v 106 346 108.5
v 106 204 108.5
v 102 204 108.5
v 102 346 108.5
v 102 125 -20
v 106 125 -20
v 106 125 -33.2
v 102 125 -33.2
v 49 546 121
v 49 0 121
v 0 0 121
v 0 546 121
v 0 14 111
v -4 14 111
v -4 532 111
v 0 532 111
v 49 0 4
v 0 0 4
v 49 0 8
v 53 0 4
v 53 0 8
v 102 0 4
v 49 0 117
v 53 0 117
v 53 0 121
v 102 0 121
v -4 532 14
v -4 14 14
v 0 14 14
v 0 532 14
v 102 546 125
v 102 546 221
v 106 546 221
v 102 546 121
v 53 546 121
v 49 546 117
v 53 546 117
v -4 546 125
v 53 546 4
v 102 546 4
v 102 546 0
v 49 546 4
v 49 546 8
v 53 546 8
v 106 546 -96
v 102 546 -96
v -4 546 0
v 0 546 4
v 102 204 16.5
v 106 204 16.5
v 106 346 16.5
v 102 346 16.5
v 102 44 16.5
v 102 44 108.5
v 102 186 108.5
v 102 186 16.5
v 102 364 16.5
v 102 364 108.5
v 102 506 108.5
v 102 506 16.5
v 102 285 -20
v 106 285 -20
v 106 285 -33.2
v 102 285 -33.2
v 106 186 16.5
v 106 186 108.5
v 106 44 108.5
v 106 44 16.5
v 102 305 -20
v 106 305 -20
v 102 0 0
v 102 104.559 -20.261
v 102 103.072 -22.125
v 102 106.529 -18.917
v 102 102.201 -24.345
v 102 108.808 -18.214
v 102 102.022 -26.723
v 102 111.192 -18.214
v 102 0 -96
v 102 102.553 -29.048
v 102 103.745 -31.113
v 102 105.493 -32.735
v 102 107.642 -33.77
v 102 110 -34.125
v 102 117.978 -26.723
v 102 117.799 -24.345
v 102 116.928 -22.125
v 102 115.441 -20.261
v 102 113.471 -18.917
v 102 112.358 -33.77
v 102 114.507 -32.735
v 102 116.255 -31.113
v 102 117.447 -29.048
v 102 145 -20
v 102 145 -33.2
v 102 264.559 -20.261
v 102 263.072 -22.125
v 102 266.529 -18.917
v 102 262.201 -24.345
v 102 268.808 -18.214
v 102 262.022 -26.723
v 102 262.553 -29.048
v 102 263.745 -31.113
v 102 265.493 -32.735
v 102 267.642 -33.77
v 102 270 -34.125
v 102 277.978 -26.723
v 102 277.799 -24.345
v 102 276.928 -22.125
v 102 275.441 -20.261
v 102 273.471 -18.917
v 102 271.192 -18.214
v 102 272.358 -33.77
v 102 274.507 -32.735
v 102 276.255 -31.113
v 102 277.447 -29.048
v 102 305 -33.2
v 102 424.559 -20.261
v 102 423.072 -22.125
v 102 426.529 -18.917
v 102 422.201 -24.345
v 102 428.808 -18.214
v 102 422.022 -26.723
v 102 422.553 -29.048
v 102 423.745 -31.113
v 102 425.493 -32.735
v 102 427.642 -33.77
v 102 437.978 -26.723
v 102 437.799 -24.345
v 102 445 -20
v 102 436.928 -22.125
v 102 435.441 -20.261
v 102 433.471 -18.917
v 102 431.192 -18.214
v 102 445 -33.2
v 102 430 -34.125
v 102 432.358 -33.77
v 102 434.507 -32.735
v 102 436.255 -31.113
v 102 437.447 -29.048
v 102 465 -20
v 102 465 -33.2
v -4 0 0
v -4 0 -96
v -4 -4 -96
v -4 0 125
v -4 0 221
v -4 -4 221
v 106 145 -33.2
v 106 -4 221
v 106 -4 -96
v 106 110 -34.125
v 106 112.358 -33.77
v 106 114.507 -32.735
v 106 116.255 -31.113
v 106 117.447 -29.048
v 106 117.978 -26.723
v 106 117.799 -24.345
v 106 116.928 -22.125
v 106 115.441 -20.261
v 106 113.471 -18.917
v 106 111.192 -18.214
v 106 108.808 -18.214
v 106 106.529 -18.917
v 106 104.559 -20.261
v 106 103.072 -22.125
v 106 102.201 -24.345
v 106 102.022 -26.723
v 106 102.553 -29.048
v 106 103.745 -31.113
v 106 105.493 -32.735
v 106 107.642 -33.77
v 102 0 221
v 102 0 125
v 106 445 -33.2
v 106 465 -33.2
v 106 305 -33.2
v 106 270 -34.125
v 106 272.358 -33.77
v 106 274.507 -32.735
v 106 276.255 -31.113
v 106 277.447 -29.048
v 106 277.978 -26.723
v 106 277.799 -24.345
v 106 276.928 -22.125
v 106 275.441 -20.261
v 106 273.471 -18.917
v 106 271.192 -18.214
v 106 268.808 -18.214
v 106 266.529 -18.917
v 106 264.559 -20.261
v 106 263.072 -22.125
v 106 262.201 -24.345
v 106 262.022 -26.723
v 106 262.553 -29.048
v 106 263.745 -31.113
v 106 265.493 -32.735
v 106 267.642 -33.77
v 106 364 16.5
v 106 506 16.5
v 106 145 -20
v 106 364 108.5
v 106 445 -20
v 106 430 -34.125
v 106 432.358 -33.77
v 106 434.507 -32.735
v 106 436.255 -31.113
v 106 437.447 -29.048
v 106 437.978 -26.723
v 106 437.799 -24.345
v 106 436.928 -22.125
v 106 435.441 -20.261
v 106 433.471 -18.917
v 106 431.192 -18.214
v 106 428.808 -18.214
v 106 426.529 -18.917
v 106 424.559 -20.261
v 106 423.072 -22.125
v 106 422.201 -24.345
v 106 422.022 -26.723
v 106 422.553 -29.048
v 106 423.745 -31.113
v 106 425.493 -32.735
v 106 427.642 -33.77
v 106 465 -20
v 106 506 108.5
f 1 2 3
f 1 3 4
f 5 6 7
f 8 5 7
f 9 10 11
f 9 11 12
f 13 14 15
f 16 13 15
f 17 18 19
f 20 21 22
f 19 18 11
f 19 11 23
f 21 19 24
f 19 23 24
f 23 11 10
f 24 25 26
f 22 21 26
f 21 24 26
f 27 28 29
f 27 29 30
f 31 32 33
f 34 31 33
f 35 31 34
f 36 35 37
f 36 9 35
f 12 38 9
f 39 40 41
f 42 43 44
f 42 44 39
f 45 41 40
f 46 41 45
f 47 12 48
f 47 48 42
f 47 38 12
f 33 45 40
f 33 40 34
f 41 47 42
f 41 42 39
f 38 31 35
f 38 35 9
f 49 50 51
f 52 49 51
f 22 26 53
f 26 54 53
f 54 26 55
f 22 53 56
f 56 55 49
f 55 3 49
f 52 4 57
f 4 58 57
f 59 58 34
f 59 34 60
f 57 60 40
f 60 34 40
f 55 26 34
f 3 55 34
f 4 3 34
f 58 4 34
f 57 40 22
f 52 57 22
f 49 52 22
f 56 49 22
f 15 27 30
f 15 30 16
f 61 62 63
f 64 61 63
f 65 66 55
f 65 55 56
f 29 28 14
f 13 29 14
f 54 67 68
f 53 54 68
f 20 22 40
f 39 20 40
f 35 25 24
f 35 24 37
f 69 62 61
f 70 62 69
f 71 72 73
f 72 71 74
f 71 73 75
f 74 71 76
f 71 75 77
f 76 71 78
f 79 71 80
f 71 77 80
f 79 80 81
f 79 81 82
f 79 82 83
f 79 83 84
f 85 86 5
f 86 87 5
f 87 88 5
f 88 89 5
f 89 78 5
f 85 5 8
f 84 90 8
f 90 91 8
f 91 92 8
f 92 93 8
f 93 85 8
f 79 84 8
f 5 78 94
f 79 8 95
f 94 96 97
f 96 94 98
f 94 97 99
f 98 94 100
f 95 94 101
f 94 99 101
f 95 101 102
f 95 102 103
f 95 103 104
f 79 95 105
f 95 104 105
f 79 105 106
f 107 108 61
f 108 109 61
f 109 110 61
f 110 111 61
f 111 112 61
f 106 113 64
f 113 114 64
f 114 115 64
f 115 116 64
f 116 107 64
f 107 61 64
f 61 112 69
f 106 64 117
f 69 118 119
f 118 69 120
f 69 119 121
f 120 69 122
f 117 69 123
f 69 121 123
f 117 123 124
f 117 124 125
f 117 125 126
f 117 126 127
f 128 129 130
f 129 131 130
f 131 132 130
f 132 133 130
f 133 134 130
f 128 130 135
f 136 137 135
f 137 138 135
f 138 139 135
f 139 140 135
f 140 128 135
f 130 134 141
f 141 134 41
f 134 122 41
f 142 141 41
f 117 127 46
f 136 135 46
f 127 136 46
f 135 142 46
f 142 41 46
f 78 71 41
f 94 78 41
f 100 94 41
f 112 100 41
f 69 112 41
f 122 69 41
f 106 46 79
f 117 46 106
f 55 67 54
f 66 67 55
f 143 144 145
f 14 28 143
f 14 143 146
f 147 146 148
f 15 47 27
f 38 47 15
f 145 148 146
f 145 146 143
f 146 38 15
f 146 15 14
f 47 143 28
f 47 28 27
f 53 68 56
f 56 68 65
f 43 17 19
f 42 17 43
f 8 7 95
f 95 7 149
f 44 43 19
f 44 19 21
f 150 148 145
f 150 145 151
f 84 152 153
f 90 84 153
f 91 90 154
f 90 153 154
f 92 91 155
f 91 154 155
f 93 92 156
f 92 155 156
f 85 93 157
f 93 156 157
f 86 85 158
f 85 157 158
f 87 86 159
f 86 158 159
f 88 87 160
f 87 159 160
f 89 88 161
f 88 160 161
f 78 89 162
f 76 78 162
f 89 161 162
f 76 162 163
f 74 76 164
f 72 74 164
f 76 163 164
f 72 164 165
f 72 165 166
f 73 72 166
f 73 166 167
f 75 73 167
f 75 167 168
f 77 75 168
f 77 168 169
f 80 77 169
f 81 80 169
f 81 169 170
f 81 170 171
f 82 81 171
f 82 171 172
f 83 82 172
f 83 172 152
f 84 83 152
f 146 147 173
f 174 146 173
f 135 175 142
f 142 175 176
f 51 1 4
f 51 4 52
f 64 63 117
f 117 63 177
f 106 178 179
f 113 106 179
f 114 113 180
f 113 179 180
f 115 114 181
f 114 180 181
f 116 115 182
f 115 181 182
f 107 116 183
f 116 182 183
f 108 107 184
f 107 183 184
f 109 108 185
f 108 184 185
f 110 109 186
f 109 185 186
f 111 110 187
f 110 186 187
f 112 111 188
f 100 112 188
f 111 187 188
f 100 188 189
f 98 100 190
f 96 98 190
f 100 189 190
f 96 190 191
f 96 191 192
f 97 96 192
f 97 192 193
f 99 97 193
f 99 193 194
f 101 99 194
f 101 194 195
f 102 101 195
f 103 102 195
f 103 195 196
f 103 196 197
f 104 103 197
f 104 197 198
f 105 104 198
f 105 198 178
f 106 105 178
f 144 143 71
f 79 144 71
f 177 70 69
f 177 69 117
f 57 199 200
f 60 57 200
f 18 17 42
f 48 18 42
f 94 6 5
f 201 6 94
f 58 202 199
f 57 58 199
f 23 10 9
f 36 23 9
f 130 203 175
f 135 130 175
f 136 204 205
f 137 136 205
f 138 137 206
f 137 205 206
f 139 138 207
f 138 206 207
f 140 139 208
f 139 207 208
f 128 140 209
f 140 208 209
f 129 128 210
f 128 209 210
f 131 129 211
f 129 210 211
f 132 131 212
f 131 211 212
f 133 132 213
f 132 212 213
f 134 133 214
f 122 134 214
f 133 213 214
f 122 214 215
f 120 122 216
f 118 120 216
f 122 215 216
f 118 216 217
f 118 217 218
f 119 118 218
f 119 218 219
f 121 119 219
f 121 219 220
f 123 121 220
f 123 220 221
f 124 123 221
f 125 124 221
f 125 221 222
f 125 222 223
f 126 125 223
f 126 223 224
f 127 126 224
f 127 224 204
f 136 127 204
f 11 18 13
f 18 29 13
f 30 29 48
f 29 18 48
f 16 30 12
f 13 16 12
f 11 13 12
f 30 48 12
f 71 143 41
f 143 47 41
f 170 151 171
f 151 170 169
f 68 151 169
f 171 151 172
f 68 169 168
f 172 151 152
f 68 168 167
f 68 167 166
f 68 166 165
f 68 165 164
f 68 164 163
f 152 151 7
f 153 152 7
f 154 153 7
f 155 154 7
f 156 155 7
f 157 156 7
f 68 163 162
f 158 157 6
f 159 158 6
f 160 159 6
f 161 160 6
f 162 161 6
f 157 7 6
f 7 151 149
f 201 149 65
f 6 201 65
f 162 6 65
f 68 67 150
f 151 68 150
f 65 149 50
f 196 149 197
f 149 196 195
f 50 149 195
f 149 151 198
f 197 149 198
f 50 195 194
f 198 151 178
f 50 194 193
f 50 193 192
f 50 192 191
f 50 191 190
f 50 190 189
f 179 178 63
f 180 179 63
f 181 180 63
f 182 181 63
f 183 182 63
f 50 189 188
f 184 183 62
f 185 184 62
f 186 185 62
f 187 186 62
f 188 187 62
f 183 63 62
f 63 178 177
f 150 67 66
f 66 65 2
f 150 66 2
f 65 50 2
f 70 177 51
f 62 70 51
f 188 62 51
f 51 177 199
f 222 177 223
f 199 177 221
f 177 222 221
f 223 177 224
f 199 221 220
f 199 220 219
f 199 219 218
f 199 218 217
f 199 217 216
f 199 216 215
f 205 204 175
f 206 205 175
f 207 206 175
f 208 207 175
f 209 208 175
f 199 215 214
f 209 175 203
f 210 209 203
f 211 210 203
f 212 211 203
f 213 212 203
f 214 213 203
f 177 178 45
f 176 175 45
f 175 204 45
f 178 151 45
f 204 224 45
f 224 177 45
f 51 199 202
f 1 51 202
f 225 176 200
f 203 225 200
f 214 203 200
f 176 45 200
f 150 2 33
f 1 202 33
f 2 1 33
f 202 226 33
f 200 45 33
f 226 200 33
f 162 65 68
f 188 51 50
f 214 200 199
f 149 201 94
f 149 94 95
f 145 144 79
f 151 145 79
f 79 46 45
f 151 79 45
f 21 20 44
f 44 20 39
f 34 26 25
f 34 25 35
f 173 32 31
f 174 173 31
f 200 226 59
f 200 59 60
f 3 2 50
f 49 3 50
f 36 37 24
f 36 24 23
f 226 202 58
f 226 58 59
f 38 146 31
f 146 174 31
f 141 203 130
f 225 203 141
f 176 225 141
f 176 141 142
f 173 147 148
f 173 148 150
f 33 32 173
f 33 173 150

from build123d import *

# Parameters (mm, degrees)
ESQUISSE1_W             = 102
ESQUISSE1_H             = 546
BOSS_EXTRU_1_DEPTH      = 125
ESQUISSE2_W             = 117
ESQUISSE2_H             = 546
ENL_V_MAT_EXTRU_1_DEPTH = 570.3373341
ESQUISSE3_W             = 4
ESQUISSE3_H             = 546
BOSS_EXTRU_2_DEPTH      = 4
ESQUISSE4_W             = 4
ESQUISSE4_H             = 546
BOSS_EXTRU_3_DEPTH      = 4
ESQUISSE5_W             = 125
ESQUISSE5_H             = 546
BOSS_EXTRU_4_DEPTH      = 4
ESQUISSE6_W             = 97
ESQUISSE6_H             = 518
ENL_V_MAT_EXTRU_2_DEPTH = 571.067539858
ESQUISSE7_W             = 317
ESQUISSE7_H             = 546
BOSS_EXTRU_5_DEPTH      = 4
ESQUISSE8_W             = 92
ESQUISSE8_H             = 142
ENL_V_MAT_EXTRU_3_DEPTH = 600.21365138
ESQUISSE10_W            = 13.2
ESQUISSE10_H            = 20
ENL_V_MAT_EXTRU_4_DEPTH = 600.21365138
ESQUISSE12_R            = 8
ENL_V_MAT_EXTRU_5_DEPTH = 600.21365138
ESQUISSE13_W            = 110
ESQUISSE13_H            = 317
BOSS_EXTRU_6_DEPTH      = 4


with BuildPart() as part:
    # Esquisse1 → Boss.-Extru.1 (new body)
    with BuildSketch(Plane.XY):
        with Locations((51, 273)):
            Rectangle(ESQUISSE1_W, ESQUISSE1_H)
    extrude(amount=BOSS_EXTRU_1_DEPTH)

    # Esquisse2 → Enlèv. mat.-Extru.1 (cut, through all)
    with BuildSketch(Plane(origin=(102, 0, 0), x_dir=(0, 0, -1), z_dir=(1, 0, 0))):
        with Locations((-62.5, 273)):
            Rectangle(ESQUISSE2_W, ESQUISSE2_H)
    extrude(amount=-ENL_V_MAT_EXTRU_1_DEPTH, mode=Mode.SUBTRACT)


with BuildPart() as enl_v_mat_extru_1_piece_1:
    # of the separate pieces the step leaves, piece 1, a body of its own (enl_v_mat_extru_1_pieces)
    add(part.part.solids().sort_by_distance((102, 0, 121))[0])

    # Esquisse3 → Boss.-Extru.2 (add)
    with BuildSketch(Plane(origin=(0, 0, 121), x_dir=(-1, 0, 0), z_dir=(0, 0, -1))):
        with Locations((-51, 273)):
            Rectangle(ESQUISSE3_W, ESQUISSE3_H)
    extrude(amount=BOSS_EXTRU_2_DEPTH)

    # Esquisse5 → Boss.-Extru.4 (add)
    with BuildSketch(Plane.ZY):
        with Locations((62.5, 273)):
            Rectangle(ESQUISSE5_W, ESQUISSE5_H)
    extrude(amount=BOSS_EXTRU_4_DEPTH)

    # Esquisse6 → Enlèv. mat.-Extru.2 (cut, through all)
    with BuildSketch(Plane.ZY.offset(4)):
        with Locations((62.5, 273)):
            Rectangle(ESQUISSE6_W, ESQUISSE6_H)
    extrude(amount=-ENL_V_MAT_EXTRU_2_DEPTH, mode=Mode.SUBTRACT)



with BuildPart() as enl_v_mat_extru_1_piece_2:
    # of the separate pieces the step leaves, piece 2, a body of its own (enl_v_mat_extru_1_pieces)
    add(part.part.solids().sort_by_distance((0, 0, 0))[0])

    # Esquisse4 → Boss.-Extru.3 (add)
    with BuildSketch(Plane.XY.offset(4)):
        with Locations((51, 273)):
            Rectangle(ESQUISSE4_W, ESQUISSE4_H)
    extrude(amount=BOSS_EXTRU_3_DEPTH)


with BuildPart() as enl_v_mat_extru_1_piece_1_1:
    add(enl_v_mat_extru_1_piece_1.part)

    add(enl_v_mat_extru_1_piece_2.part)  # Boss.-Extru.5 merges Enlèv. mat.-Extru.1 piece 2
    # Esquisse7 → Boss.-Extru.5 (add)
    with BuildSketch(Plane(origin=(102, 0, 0), x_dir=(0, 0, -1), z_dir=(1, 0, 0))):
        with Locations((-62.5, 273)):
            Rectangle(ESQUISSE7_W, ESQUISSE7_H)
    extrude(amount=BOSS_EXTRU_5_DEPTH)

    # Esquisse8 → Enlèv. mat.-Extru.3 (cut, through all)
    with BuildSketch(Plane(origin=(106, 0, 0), x_dir=(0, 0, -1), z_dir=(1, 0, 0))):
        with Locations((-62.5, 115)):
            Rectangle(ESQUISSE8_W, ESQUISSE8_H)
        with Locations((-62.5, 275)):
            Rectangle(ESQUISSE8_W, ESQUISSE8_H)
        with Locations((-62.5, 435)):
            Rectangle(ESQUISSE8_W, ESQUISSE8_H)
    extrude(amount=-ENL_V_MAT_EXTRU_3_DEPTH, mode=Mode.SUBTRACT)

    # Esquisse10 → Enlèv. mat.-Extru.4 (cut, through all)
    with BuildSketch(Plane(origin=(106, 0, 0), x_dir=(0, 0, -1), z_dir=(1, 0, 0))):
        with Locations((26.6, 135)):
            Rectangle(ESQUISSE10_W, ESQUISSE10_H)
        with Locations((26.6, 295)):
            Rectangle(ESQUISSE10_W, ESQUISSE10_H)
        with Locations((26.6, 455)):
            Rectangle(ESQUISSE10_W, ESQUISSE10_H)
    extrude(amount=-ENL_V_MAT_EXTRU_4_DEPTH, mode=Mode.SUBTRACT)

    # Esquisse12 → Enlèv. mat.-Extru.5 (cut, through all)
    with BuildSketch(Plane(origin=(106, 0, 0), x_dir=(0, 0, -1), z_dir=(1, 0, 0))):
        with Locations((26.125, 110)):
            Circle(ESQUISSE12_R)
        with Locations((26.125, 270)):
            Circle(ESQUISSE12_R)
        with Locations((26.125, 430)):
            Circle(ESQUISSE12_R)
    extrude(amount=-ENL_V_MAT_EXTRU_5_DEPTH, mode=Mode.SUBTRACT)

    # Esquisse13 → Boss.-Extru.6 (add)
    with BuildSketch(Plane.XZ):
        with Locations((51, 62.5)):
            Rectangle(ESQUISSE13_W, ESQUISSE13_H)
    extrude(amount=BOSS_EXTRU_6_DEPTH)


solid = enl_v_mat_extru_1_piece_1_1.part
